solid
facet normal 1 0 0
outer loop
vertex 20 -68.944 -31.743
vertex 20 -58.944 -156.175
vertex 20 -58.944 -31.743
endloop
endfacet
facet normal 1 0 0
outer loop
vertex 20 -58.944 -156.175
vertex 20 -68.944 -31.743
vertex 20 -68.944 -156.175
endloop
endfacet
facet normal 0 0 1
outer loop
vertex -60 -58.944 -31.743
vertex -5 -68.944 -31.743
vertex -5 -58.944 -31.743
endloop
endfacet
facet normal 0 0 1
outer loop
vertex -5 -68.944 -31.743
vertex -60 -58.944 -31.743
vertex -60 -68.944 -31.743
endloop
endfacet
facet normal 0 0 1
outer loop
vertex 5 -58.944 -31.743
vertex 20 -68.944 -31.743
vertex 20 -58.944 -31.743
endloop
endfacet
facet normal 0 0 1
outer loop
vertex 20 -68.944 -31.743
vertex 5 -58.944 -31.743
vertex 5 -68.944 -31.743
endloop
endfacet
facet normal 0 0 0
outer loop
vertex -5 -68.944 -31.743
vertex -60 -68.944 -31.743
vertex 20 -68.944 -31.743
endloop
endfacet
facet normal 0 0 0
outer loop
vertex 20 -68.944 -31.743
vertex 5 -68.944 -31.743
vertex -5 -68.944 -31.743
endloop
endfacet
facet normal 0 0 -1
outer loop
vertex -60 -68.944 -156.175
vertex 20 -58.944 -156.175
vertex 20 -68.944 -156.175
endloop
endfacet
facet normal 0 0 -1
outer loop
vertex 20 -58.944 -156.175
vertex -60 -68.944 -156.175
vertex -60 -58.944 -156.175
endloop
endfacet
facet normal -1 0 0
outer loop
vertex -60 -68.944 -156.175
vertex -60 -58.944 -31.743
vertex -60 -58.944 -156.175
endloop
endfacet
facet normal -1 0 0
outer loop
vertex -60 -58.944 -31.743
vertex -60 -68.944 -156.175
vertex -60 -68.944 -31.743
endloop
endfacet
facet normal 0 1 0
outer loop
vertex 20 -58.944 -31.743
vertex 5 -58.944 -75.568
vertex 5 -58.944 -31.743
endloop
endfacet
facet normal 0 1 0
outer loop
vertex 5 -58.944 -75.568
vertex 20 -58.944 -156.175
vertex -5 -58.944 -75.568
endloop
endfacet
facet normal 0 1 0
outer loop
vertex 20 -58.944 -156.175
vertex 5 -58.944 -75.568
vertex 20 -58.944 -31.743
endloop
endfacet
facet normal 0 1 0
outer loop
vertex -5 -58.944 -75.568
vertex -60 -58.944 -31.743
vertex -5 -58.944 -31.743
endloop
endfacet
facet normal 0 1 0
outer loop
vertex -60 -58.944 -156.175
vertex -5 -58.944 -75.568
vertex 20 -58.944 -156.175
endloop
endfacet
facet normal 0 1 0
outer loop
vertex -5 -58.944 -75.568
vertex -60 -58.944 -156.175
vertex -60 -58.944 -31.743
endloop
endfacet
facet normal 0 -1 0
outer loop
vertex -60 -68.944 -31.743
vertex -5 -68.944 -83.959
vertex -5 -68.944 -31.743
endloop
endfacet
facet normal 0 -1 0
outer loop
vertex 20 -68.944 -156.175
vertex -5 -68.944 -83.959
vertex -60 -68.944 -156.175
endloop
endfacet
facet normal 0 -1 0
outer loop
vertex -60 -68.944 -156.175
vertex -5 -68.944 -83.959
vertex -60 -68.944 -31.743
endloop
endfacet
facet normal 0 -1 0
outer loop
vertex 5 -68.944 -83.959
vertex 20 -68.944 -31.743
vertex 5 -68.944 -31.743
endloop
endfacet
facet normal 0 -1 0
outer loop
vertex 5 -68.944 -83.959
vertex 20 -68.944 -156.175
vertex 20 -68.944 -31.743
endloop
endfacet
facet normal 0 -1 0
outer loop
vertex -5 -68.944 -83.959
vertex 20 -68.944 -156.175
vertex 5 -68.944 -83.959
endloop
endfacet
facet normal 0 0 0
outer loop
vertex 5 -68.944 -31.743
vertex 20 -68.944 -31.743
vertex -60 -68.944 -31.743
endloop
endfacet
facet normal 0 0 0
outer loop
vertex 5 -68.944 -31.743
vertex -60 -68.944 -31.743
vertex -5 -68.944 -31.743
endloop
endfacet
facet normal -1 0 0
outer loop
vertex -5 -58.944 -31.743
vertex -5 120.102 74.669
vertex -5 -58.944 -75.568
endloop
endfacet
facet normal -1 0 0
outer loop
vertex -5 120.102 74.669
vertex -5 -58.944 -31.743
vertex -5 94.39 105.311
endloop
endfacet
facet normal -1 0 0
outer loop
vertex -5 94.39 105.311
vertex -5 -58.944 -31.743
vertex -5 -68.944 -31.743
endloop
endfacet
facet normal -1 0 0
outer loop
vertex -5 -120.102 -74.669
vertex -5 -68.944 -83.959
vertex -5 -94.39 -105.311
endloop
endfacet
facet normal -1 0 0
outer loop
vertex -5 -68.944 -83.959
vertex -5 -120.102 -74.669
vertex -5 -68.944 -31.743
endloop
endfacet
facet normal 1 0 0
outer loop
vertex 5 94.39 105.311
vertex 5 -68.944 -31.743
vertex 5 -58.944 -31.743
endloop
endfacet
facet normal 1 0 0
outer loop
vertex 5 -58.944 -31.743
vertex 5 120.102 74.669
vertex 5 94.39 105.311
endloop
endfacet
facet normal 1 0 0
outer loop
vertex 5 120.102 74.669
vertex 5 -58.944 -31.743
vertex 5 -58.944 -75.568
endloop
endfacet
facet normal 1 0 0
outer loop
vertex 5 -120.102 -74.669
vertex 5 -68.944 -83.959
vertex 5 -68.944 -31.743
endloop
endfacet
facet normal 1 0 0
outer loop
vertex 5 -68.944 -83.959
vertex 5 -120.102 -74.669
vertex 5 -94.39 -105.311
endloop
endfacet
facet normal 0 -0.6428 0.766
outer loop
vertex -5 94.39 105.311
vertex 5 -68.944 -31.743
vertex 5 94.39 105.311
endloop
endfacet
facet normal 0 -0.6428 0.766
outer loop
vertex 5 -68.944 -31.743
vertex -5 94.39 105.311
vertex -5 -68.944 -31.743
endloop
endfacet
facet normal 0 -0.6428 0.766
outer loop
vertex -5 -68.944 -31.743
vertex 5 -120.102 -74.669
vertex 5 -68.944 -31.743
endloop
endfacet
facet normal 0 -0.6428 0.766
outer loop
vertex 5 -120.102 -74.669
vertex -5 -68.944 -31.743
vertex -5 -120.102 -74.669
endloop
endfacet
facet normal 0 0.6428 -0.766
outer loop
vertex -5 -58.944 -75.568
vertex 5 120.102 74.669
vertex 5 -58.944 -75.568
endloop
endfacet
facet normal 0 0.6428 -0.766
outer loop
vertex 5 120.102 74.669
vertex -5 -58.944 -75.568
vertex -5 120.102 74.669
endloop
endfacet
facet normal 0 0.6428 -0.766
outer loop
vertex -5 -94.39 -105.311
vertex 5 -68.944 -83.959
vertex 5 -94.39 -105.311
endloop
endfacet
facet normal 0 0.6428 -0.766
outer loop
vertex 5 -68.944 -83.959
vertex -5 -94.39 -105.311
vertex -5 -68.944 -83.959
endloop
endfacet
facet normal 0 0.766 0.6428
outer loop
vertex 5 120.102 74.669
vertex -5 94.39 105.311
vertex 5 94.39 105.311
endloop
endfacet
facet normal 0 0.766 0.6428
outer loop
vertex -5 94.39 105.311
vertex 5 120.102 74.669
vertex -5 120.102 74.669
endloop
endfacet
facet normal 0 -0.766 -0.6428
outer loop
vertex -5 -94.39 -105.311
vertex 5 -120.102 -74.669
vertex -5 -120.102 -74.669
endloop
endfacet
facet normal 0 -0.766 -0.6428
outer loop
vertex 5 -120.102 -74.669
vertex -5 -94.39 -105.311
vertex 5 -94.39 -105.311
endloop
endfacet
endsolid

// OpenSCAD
module arm_extension_right(arm_x,arm_y,arm_z,attachLength,rotate_angle){
    y_tran = -(arm_y/2-attachLength)*cos(rotate_angle);
    z_tran = -(arm_y/2-attachLength)*sin(rotate_angle)-arm_z/2/cos(rotate_angle);
    translate([-20,y_tran+5,z_tran-10])
    cube([80,10,arm_z/cos(rotate_angle)*2+20],center=true);
    rotate([rotate_angle,0,0])
    cube([arm_x, arm_y, arm_z],center=true); 
    
}

//size of the arm extension
arm_ex_x = 10;
arm_ex_y = 280;
arm_ex_z = 40;
//the length of arm extension attaced on the box
attachLength = 50;
z_lift = 20;
//the angle between the arm extension and the box
rotate_angle=40;

arm_extension_right(arm_ex_x,arm_ex_y,arm_ex_z,attachLength,rotate_angle);
